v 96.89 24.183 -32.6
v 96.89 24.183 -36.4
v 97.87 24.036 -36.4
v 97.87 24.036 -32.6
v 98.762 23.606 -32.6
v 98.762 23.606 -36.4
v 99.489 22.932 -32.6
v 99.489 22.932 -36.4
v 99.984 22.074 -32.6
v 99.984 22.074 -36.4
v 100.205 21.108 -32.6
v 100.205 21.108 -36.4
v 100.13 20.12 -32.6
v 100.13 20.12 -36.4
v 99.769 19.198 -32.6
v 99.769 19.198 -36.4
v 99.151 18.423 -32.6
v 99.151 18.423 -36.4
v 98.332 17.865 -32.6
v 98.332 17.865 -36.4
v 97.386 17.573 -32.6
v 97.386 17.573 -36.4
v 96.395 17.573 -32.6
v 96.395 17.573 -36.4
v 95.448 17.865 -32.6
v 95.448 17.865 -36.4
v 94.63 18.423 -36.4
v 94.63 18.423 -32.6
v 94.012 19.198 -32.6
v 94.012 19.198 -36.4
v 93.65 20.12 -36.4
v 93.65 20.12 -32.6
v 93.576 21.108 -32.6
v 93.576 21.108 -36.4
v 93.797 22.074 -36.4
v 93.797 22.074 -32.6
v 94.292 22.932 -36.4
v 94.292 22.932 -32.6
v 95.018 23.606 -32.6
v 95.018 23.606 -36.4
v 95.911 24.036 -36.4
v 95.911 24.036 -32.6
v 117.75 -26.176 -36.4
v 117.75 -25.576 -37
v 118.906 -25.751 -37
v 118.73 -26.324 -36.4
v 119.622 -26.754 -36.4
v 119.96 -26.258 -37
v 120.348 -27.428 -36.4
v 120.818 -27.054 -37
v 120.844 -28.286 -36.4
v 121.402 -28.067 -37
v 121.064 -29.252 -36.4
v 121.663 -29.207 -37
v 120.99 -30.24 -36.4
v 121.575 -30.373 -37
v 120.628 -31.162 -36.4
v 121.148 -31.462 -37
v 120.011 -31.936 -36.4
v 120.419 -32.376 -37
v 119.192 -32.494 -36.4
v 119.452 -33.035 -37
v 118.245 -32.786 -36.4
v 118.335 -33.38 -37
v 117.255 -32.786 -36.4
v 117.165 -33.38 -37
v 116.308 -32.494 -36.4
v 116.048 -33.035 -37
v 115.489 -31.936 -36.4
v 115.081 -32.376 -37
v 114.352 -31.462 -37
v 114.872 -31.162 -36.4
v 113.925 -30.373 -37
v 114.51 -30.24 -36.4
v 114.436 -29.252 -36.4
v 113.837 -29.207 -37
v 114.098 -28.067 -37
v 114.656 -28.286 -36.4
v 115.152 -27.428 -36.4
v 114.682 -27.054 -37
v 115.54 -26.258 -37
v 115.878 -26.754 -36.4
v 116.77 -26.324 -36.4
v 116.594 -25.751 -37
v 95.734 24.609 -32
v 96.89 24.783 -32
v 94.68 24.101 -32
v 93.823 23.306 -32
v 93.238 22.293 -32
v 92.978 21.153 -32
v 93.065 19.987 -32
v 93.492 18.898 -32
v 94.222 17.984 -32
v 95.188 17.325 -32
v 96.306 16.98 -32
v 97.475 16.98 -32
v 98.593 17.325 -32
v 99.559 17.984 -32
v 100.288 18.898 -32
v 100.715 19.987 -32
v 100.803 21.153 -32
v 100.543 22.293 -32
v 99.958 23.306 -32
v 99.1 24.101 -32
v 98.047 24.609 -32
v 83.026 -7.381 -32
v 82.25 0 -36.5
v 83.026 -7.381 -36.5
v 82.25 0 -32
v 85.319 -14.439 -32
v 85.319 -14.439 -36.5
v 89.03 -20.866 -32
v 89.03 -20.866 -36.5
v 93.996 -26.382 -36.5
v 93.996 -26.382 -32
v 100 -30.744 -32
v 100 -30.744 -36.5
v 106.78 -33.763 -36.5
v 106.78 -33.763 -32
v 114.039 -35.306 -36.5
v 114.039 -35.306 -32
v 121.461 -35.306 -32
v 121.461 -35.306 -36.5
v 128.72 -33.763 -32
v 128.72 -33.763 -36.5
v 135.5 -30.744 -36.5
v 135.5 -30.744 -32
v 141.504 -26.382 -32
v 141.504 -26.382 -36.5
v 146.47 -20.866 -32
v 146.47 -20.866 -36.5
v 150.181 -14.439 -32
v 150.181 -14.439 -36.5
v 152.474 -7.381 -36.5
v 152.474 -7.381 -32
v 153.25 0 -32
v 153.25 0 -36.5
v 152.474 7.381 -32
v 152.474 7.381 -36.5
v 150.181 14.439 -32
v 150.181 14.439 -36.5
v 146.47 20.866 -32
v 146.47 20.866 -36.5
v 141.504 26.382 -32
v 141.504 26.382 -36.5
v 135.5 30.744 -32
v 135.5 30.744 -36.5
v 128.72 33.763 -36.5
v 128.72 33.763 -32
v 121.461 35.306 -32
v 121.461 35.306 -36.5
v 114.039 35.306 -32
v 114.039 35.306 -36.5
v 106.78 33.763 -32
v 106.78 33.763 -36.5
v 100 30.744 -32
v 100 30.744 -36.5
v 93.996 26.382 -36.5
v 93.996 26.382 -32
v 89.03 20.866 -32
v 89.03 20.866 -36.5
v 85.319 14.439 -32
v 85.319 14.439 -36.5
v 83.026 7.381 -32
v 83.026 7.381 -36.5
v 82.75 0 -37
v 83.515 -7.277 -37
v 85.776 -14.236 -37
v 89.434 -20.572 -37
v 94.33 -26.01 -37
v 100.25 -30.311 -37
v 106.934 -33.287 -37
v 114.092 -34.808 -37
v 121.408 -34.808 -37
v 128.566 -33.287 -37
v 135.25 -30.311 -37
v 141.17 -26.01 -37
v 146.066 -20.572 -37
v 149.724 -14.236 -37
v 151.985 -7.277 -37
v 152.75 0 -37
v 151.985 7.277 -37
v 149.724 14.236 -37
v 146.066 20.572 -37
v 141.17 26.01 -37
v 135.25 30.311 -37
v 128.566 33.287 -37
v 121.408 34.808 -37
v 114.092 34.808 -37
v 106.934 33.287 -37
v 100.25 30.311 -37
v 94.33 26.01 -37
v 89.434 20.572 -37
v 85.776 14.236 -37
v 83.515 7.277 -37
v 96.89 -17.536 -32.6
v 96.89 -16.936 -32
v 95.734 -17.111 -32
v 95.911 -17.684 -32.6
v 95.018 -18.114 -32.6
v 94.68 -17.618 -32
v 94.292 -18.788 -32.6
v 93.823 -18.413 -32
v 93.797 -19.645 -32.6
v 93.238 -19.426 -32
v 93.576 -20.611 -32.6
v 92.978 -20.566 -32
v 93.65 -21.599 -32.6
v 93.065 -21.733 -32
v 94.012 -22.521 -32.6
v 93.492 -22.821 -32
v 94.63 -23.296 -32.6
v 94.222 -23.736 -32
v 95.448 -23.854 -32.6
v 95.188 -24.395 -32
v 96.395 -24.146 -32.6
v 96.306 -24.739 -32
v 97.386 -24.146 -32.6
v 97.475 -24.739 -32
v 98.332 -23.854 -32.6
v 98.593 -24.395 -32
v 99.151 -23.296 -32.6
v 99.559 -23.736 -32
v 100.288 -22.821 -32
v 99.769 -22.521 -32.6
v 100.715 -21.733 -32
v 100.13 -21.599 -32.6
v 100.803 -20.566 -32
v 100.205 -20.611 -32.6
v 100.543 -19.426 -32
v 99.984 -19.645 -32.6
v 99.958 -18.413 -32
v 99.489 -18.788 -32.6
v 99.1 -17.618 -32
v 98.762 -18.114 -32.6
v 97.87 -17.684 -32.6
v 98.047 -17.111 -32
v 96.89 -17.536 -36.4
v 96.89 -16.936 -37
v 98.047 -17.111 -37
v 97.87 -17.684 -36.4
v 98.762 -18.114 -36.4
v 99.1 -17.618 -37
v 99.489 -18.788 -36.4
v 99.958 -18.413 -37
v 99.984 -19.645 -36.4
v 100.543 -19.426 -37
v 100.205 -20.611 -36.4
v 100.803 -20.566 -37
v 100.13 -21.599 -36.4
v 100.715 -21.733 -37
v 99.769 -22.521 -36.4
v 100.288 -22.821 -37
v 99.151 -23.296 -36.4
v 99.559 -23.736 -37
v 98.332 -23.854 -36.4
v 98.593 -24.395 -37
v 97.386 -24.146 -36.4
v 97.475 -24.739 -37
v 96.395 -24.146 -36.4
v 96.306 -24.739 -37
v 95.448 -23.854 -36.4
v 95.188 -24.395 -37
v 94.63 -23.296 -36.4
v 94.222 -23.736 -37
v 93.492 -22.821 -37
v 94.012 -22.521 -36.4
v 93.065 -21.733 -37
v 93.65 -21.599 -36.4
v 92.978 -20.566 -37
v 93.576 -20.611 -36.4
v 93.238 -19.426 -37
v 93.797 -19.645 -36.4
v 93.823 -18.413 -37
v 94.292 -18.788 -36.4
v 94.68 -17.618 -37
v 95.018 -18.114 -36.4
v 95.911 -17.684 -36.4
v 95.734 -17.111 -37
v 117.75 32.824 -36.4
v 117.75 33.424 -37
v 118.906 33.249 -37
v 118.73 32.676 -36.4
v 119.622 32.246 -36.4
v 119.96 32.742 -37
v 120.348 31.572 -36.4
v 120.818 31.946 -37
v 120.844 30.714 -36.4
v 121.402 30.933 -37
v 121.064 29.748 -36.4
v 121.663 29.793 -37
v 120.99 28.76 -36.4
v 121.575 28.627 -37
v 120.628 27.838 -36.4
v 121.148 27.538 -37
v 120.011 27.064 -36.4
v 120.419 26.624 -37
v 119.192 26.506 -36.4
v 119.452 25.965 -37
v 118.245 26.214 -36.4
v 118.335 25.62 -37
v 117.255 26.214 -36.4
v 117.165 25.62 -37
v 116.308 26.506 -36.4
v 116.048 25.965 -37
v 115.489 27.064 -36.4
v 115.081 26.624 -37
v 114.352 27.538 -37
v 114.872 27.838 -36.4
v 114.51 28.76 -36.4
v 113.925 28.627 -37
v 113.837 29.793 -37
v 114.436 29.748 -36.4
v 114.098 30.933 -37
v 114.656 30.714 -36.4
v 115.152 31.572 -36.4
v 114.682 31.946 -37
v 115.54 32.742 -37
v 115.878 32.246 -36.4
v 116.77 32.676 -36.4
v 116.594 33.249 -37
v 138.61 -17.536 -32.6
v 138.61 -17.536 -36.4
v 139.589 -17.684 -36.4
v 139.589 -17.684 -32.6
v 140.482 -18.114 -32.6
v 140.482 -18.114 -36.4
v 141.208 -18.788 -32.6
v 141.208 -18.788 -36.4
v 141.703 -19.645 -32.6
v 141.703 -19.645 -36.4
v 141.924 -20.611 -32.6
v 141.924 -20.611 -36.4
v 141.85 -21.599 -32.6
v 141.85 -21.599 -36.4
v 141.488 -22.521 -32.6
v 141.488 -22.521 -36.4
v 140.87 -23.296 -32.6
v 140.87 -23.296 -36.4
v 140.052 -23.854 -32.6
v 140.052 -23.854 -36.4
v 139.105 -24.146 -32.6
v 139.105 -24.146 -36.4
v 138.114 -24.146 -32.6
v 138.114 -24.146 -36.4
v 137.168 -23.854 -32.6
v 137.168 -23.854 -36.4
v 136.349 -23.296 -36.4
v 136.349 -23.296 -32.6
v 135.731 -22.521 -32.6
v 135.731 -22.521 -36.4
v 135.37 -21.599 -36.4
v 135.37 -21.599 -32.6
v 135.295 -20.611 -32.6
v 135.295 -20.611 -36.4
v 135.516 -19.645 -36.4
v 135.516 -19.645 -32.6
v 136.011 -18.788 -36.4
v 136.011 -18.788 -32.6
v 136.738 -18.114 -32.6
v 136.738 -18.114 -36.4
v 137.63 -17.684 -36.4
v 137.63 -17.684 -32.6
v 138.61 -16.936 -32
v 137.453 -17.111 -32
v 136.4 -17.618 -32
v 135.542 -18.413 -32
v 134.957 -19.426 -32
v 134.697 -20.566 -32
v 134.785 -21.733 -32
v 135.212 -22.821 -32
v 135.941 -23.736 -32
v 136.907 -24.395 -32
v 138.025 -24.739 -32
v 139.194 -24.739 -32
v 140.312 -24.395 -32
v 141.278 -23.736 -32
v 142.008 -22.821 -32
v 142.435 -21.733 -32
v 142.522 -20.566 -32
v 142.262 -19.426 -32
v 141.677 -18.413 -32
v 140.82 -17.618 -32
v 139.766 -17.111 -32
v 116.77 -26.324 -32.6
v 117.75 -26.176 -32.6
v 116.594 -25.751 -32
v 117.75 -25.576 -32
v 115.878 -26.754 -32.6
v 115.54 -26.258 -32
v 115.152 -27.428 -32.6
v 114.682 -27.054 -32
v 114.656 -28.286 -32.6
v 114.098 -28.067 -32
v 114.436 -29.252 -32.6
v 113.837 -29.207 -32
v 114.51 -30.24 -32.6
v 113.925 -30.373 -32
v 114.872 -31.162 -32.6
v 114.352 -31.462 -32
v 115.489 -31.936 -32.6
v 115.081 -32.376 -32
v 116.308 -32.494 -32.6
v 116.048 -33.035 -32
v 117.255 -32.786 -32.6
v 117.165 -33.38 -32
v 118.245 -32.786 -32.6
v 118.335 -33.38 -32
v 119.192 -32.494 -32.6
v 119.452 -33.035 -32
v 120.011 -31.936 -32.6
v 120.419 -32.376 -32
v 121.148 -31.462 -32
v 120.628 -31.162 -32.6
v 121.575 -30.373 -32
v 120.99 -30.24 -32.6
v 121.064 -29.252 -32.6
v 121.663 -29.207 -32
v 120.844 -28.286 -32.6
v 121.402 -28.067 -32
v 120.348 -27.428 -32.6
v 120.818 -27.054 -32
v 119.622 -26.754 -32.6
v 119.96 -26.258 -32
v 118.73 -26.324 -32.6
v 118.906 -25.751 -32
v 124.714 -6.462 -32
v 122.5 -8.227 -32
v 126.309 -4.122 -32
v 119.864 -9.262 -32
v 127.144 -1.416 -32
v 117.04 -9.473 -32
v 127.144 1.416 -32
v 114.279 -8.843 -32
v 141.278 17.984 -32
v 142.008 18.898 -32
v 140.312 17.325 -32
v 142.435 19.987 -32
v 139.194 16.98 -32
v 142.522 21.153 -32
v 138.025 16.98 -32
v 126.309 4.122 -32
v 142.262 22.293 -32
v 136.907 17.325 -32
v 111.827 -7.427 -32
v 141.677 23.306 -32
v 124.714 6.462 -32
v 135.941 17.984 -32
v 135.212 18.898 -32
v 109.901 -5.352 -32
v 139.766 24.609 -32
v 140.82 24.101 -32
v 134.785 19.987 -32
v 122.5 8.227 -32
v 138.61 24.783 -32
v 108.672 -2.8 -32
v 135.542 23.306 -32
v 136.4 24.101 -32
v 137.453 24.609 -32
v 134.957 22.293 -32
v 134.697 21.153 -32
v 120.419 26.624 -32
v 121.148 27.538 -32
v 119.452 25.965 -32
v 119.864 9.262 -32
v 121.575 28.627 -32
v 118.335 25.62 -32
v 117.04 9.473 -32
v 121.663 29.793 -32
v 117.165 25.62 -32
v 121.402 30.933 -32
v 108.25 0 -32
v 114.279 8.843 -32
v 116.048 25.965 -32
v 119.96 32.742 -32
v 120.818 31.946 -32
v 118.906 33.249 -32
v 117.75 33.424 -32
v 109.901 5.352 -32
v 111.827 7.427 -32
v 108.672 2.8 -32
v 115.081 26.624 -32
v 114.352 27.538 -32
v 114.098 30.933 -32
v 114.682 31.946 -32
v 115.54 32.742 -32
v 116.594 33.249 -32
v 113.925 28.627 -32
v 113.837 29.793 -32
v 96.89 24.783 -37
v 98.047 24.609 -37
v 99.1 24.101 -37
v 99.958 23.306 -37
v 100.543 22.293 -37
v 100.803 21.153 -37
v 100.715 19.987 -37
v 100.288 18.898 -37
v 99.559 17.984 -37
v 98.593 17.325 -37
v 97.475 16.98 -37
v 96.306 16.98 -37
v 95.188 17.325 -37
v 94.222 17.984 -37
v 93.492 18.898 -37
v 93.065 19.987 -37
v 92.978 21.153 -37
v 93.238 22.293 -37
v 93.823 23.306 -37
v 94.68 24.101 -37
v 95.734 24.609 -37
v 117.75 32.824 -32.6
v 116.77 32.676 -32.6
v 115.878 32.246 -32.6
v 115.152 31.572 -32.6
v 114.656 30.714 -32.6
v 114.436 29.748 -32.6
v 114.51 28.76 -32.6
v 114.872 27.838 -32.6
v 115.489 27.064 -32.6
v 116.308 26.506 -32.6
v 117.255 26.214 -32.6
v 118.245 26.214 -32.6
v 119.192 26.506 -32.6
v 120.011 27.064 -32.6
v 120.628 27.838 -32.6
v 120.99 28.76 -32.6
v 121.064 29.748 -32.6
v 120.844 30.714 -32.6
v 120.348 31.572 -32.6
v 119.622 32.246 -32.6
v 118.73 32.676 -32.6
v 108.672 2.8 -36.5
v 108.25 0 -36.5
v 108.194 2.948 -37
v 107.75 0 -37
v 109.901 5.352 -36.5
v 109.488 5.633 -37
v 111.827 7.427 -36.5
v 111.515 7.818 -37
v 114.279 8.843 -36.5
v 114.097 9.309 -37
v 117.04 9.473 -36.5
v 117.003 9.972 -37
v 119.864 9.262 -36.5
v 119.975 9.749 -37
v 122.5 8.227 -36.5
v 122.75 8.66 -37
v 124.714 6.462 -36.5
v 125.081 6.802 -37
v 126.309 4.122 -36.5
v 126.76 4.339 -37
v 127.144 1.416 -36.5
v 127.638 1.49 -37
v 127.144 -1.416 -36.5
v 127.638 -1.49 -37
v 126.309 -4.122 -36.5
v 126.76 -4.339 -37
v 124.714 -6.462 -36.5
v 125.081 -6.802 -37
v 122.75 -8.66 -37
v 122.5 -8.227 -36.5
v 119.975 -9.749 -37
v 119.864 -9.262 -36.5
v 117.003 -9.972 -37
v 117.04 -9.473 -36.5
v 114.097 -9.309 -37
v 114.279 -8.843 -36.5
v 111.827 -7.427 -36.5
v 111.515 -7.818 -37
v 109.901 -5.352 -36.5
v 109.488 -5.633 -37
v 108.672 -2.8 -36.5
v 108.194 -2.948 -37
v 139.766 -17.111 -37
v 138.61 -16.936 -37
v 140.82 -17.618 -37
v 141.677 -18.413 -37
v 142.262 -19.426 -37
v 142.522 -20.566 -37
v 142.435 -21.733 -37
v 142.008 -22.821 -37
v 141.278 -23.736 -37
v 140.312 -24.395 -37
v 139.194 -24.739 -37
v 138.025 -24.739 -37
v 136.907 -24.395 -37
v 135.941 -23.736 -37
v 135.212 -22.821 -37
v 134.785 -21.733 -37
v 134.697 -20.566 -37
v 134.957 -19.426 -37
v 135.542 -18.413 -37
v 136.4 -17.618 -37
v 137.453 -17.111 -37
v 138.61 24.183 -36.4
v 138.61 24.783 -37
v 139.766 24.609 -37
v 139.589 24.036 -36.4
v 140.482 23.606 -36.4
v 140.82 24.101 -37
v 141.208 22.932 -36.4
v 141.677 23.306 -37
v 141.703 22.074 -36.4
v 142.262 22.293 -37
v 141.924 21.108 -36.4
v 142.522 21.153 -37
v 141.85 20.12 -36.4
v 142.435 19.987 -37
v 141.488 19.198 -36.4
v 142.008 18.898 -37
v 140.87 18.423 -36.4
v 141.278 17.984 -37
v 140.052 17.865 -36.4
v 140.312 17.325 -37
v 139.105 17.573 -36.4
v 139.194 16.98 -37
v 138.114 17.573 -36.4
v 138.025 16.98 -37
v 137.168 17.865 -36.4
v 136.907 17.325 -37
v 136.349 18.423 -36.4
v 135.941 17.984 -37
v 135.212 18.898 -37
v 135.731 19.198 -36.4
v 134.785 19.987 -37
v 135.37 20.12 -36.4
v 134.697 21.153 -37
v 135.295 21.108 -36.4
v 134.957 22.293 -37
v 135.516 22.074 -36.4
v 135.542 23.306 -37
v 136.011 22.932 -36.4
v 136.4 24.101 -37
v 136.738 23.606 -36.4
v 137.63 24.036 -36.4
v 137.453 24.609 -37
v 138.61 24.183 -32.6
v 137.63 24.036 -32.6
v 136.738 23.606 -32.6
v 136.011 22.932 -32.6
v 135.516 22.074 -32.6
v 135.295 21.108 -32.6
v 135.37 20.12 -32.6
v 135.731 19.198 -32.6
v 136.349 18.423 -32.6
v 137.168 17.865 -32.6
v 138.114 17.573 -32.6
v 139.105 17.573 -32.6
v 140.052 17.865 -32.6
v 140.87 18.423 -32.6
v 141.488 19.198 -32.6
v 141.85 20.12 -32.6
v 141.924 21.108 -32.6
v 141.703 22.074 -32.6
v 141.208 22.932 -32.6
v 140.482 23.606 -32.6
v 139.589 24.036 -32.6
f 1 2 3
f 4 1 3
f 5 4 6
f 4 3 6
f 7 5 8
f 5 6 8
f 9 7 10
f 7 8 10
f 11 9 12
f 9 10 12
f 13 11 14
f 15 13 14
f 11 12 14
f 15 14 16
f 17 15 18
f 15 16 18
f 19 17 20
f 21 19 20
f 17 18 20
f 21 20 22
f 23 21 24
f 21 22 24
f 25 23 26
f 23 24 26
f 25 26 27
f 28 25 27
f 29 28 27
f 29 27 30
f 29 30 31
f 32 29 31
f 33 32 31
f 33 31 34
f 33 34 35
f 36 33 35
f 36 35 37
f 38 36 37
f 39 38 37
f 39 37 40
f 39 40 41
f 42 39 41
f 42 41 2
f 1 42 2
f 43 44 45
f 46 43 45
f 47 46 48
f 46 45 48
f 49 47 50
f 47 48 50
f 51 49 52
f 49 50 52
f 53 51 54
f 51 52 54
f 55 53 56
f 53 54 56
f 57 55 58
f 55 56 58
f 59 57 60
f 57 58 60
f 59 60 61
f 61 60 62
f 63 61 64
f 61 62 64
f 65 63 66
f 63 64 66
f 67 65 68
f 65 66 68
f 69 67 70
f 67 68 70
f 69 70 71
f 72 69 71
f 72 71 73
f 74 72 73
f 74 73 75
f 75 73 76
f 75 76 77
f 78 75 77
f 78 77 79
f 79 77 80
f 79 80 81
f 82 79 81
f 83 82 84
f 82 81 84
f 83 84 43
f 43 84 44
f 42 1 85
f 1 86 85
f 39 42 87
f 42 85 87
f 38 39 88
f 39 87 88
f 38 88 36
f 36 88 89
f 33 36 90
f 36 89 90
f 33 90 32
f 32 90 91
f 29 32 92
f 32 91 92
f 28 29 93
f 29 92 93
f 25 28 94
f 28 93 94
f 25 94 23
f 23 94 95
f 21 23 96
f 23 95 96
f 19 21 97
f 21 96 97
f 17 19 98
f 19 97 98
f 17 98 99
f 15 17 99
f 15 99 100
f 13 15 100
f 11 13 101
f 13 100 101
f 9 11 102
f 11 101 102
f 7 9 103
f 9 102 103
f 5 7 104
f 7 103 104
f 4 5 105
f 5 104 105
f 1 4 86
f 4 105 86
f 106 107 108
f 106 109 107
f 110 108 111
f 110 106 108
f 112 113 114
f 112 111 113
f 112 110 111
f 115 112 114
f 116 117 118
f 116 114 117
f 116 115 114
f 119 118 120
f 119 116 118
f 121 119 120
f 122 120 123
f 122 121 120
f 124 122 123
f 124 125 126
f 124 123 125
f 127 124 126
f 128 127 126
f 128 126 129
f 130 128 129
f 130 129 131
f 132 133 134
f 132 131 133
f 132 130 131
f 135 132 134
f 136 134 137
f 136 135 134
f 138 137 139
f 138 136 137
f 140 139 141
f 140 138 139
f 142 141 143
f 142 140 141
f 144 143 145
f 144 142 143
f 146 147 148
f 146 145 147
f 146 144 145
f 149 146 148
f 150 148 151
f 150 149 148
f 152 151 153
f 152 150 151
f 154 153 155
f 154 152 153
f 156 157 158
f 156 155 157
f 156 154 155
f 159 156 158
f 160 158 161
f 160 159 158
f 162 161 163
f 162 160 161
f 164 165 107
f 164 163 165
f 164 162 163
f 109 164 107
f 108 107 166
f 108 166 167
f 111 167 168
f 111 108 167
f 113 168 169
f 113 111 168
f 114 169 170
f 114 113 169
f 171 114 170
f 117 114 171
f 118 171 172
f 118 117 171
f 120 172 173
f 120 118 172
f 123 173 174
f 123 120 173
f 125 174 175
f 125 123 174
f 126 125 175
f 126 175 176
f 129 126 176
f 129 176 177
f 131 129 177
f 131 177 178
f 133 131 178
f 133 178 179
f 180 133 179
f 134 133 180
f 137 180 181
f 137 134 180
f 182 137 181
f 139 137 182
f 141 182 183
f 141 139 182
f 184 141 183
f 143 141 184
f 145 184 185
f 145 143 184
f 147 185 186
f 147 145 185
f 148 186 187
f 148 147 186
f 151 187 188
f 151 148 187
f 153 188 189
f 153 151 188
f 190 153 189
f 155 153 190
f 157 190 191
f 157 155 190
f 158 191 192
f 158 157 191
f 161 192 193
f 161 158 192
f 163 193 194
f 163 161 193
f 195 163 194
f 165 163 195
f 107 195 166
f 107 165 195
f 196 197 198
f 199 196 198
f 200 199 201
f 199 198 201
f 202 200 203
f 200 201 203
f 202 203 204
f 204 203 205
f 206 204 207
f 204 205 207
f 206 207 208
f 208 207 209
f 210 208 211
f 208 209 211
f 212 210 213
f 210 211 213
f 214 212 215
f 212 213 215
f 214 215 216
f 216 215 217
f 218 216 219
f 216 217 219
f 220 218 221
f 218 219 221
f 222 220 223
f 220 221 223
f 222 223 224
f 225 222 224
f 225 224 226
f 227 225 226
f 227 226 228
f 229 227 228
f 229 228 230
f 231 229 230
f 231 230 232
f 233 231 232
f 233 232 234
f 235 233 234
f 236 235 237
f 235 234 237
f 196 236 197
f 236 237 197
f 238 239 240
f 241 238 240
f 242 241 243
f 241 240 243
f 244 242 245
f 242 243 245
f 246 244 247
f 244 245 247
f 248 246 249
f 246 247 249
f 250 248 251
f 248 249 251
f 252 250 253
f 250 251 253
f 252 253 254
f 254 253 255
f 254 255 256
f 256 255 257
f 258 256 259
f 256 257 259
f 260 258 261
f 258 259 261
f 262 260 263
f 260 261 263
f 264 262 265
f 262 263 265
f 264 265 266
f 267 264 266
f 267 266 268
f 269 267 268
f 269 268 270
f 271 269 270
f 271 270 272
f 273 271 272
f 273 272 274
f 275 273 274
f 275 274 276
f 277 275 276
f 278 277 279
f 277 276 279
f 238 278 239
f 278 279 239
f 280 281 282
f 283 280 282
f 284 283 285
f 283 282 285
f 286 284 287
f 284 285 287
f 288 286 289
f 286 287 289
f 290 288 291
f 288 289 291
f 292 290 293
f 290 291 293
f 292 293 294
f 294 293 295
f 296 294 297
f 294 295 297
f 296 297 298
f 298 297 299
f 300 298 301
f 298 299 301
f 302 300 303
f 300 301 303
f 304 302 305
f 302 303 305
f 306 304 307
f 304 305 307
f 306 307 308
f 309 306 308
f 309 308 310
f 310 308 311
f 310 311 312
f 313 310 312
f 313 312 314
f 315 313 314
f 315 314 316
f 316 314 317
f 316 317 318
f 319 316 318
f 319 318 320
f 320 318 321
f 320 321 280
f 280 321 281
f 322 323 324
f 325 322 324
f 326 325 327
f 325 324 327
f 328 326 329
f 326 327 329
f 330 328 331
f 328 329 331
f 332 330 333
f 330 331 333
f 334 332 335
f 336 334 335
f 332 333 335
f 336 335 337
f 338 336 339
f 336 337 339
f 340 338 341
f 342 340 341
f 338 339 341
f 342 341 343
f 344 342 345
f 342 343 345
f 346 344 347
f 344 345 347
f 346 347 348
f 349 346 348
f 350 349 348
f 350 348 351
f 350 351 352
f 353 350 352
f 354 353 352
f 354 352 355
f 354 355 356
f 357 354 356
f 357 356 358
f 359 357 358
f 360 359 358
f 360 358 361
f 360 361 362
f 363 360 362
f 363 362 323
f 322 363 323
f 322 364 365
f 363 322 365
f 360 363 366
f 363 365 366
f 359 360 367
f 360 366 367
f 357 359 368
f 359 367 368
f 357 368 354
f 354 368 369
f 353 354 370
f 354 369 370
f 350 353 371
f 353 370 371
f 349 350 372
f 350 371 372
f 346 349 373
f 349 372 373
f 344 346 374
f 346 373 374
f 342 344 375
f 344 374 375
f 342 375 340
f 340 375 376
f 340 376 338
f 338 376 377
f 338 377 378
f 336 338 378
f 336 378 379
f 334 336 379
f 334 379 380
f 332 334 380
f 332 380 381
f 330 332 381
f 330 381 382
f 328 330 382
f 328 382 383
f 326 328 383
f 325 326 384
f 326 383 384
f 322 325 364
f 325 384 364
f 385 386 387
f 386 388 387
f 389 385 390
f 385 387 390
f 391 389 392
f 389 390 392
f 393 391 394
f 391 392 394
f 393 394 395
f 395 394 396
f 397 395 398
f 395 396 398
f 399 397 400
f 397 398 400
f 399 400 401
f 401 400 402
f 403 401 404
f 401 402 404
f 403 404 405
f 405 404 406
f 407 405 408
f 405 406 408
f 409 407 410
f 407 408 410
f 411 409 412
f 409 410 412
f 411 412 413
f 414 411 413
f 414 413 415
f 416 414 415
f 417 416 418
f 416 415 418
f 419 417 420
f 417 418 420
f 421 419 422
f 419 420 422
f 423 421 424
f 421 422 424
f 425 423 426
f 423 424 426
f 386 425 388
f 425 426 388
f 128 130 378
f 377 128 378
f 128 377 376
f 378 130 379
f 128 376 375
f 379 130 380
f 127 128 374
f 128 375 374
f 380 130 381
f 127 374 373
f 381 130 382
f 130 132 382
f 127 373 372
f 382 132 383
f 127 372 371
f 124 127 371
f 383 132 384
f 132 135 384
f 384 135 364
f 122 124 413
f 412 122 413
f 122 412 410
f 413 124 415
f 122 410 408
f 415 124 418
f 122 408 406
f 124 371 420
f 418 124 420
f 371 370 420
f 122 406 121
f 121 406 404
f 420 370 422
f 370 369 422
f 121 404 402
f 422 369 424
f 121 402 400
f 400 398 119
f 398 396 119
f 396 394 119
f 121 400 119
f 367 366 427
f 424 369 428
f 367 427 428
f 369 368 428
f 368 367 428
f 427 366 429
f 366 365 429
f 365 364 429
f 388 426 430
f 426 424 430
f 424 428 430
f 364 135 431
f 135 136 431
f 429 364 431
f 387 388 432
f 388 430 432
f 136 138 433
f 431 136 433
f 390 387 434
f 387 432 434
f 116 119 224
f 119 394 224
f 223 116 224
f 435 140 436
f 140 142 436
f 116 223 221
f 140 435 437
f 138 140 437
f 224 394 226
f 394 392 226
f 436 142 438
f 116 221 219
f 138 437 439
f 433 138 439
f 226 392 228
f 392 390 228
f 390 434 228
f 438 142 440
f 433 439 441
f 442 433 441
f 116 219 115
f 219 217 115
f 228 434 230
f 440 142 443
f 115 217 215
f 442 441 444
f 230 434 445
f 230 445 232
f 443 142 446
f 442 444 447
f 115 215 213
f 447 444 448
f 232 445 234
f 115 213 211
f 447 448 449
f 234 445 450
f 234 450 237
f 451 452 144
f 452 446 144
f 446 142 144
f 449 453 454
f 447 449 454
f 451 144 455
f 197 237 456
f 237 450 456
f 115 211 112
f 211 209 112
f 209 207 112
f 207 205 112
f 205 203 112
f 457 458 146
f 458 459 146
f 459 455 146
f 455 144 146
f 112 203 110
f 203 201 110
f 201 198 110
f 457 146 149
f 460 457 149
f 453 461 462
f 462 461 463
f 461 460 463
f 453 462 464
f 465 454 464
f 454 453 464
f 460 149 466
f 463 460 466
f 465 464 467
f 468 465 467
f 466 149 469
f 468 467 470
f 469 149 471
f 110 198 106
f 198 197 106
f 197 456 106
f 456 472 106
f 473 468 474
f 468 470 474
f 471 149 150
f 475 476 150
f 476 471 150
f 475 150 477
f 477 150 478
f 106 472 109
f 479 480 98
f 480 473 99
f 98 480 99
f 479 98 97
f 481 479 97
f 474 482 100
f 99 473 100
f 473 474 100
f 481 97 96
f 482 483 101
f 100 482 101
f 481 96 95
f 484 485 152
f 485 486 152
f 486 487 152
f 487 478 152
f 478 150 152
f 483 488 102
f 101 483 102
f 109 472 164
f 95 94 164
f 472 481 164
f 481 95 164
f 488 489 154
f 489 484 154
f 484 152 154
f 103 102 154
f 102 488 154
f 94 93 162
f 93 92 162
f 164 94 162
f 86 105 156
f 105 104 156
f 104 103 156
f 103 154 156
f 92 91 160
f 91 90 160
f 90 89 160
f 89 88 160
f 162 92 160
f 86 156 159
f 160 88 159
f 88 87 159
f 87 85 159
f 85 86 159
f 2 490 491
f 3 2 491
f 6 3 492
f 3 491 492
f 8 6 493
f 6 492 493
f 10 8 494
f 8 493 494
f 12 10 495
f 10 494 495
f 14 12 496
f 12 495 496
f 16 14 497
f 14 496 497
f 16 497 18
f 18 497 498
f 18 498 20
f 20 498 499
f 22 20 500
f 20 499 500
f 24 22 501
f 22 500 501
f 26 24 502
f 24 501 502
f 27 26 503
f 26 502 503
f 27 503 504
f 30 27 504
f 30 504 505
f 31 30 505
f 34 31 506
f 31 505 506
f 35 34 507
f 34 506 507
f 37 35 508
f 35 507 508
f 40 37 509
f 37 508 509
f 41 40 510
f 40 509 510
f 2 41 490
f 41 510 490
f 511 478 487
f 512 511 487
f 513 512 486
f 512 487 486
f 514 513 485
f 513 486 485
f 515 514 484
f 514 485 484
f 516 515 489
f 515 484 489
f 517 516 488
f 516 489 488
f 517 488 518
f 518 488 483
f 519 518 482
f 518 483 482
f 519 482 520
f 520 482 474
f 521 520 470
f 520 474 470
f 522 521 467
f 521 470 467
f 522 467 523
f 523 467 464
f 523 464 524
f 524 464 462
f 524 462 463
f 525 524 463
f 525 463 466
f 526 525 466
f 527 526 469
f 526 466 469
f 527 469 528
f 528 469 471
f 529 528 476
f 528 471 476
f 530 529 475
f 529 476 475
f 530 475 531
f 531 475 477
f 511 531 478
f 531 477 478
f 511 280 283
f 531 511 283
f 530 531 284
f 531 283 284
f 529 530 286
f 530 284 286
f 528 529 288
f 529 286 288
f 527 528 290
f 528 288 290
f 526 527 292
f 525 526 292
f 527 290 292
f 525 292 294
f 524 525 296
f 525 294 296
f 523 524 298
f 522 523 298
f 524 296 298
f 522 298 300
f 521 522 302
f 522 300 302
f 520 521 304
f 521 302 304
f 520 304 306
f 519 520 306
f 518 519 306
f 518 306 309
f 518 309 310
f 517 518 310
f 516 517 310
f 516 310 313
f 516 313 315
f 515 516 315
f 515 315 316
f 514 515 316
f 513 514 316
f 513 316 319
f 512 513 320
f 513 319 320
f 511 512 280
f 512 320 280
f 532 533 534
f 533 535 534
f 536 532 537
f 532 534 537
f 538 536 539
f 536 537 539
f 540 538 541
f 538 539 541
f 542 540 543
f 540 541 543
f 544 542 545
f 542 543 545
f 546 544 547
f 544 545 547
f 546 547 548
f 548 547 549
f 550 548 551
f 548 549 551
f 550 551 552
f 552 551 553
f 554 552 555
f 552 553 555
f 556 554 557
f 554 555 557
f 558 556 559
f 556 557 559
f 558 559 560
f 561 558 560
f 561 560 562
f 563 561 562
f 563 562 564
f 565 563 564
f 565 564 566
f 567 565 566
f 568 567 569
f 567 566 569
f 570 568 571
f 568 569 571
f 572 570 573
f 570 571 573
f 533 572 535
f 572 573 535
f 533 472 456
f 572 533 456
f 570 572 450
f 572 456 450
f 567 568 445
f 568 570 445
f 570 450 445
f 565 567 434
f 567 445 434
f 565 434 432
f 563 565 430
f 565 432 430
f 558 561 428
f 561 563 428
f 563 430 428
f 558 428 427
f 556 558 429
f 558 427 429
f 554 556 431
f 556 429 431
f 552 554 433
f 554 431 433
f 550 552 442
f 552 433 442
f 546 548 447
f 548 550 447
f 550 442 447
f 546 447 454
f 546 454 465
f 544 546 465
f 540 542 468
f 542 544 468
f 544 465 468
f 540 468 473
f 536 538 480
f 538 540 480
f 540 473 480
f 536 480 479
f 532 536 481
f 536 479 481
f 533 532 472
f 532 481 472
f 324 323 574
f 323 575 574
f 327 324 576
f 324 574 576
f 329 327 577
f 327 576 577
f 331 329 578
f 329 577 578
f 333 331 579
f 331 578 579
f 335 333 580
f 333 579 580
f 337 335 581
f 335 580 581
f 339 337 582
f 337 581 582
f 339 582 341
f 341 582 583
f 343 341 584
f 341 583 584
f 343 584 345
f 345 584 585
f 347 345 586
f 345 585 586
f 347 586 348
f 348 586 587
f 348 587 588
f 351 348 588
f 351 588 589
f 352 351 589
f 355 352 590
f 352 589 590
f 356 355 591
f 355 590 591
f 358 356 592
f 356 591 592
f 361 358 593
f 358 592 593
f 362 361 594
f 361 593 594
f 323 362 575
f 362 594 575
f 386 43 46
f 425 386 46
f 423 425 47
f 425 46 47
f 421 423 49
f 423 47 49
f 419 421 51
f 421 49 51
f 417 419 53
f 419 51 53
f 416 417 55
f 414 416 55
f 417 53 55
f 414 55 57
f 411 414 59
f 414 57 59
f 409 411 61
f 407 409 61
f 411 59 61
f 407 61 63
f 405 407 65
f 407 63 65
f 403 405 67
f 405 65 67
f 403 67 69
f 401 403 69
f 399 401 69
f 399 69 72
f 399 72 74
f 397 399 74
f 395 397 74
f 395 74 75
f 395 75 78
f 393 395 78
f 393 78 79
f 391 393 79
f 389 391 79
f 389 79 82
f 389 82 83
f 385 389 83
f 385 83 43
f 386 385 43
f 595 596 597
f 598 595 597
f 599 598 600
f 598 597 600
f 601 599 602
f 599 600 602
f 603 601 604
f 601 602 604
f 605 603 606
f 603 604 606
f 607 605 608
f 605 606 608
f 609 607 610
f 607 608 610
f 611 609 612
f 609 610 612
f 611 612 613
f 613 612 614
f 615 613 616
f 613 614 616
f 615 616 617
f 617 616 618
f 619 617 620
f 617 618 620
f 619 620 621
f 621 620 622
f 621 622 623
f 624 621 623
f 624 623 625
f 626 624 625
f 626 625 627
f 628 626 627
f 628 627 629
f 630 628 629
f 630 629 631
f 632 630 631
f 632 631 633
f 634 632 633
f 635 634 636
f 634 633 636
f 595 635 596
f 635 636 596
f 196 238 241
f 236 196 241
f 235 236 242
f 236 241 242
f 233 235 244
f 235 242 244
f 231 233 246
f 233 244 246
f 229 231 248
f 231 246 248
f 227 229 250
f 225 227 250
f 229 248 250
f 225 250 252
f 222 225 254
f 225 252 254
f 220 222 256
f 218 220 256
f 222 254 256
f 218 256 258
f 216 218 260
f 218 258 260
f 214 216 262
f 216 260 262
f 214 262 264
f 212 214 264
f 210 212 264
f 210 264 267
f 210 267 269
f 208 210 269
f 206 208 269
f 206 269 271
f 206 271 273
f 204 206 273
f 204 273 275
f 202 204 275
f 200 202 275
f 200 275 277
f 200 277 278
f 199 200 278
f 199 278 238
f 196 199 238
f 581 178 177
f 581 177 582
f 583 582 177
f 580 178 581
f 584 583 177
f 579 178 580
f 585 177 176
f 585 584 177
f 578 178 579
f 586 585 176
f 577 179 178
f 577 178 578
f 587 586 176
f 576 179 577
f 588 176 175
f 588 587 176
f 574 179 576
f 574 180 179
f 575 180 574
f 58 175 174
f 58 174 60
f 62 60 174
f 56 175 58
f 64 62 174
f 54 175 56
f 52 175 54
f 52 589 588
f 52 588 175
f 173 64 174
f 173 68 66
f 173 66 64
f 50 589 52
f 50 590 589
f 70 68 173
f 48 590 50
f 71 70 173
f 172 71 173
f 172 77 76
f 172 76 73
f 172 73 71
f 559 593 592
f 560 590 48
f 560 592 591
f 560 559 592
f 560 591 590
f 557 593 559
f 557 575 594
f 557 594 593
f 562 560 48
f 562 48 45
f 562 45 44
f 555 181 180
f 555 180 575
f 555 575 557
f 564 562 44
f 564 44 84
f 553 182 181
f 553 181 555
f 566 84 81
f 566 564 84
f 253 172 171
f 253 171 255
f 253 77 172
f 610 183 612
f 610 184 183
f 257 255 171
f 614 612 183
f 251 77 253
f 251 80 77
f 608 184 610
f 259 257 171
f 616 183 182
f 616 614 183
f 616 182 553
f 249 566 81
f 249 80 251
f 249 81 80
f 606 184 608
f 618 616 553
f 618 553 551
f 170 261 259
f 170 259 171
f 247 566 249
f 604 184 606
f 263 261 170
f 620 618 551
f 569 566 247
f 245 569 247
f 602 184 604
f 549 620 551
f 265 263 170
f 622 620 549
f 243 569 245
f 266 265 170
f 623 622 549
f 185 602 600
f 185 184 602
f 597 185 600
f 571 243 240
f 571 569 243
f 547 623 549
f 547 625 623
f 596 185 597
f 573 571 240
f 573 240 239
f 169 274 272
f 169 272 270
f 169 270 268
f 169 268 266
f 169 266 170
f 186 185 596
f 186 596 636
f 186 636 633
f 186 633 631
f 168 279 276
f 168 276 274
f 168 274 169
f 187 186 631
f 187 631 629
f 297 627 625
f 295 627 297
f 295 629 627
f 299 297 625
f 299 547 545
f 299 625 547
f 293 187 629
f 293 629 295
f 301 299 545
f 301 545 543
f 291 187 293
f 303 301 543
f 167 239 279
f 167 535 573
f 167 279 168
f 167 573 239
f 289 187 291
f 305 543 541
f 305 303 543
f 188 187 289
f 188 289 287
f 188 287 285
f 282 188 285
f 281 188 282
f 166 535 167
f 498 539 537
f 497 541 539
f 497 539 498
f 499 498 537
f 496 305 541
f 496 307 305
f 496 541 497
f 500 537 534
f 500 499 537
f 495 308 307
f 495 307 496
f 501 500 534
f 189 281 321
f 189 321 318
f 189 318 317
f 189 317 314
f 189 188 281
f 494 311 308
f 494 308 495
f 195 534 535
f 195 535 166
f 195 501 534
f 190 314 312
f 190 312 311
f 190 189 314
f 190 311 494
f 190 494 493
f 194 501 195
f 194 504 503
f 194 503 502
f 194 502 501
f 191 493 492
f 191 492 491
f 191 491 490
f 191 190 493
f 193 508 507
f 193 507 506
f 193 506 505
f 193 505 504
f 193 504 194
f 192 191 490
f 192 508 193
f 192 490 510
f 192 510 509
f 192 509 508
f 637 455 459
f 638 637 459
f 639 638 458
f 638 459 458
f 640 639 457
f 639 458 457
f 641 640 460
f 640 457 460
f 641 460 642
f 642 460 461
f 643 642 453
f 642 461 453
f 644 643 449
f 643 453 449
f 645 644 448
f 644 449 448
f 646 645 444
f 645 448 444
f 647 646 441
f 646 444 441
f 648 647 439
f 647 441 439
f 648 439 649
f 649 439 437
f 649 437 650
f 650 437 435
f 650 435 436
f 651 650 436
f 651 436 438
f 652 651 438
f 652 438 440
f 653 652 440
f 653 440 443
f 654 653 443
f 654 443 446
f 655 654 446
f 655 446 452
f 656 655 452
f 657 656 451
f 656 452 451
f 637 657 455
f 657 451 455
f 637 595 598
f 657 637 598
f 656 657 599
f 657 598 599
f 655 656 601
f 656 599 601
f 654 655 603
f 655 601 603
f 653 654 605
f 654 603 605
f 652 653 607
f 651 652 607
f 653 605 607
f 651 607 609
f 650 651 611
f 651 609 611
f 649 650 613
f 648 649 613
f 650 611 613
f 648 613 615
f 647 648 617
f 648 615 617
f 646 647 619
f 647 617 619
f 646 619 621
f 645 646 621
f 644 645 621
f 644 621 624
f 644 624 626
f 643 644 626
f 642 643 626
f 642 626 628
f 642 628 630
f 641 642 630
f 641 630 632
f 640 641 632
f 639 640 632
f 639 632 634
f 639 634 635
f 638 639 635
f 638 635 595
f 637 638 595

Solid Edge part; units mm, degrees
sketch "Sketch1" plane through (0, 0, -32) normal (0, 0, -1) x (-1, 0, 0)
  circle A0 centre (-117.75, 0) radius 35.5
  circle A1 centre (-117.75, 0) radius 9.5
extrude "Protrusion1" add sketch "Sketch1" along normal blind 5
chamfer "Faza_1" distance 0.5 angle 45 2 edges at (127.25, 0, -37) (153.25, 0, -37)
hole "Otwór_1" at (138.6097, -20.8597, -37) direction (0, 0, 1) diameter 6.647 end up to next start chamfer 0.6 start chamfer angle 45 end chamfer 0.6 end chamfer angle 45
hole "Hole1" at (117.75, -29.5, -37) direction (0, 0, 1) diameter 6.647 end up to next start chamfer 0.6 start chamfer angle 45 end chamfer 0.6 end chamfer angle 45
hole "Hole2" at (96.8903, -20.8597, -37) direction (0, 0, 1) diameter 6.647 end up to next start chamfer 0.6 start chamfer angle 45 end chamfer 0.6 end chamfer angle 45
hole "Hole3" at (96.8903, 20.8597, -37) direction (0, 0, 1) diameter 6.647 end up to next start chamfer 0.6 start chamfer angle 45 end chamfer 0.6 end chamfer angle 45
hole "Hole4" at (117.75, 29.5, -37) direction (0, 0, 1) diameter 6.647 end up to next start chamfer 0.6 start chamfer angle 45 end chamfer 0.6 end chamfer angle 45
hole "Hole5" at (138.6097, 20.8597, -37) direction (0, 0, 1) diameter 6.647 end up to next start chamfer 0.6 start chamfer angle 45 end chamfer 0.6 end chamfer angle 45
